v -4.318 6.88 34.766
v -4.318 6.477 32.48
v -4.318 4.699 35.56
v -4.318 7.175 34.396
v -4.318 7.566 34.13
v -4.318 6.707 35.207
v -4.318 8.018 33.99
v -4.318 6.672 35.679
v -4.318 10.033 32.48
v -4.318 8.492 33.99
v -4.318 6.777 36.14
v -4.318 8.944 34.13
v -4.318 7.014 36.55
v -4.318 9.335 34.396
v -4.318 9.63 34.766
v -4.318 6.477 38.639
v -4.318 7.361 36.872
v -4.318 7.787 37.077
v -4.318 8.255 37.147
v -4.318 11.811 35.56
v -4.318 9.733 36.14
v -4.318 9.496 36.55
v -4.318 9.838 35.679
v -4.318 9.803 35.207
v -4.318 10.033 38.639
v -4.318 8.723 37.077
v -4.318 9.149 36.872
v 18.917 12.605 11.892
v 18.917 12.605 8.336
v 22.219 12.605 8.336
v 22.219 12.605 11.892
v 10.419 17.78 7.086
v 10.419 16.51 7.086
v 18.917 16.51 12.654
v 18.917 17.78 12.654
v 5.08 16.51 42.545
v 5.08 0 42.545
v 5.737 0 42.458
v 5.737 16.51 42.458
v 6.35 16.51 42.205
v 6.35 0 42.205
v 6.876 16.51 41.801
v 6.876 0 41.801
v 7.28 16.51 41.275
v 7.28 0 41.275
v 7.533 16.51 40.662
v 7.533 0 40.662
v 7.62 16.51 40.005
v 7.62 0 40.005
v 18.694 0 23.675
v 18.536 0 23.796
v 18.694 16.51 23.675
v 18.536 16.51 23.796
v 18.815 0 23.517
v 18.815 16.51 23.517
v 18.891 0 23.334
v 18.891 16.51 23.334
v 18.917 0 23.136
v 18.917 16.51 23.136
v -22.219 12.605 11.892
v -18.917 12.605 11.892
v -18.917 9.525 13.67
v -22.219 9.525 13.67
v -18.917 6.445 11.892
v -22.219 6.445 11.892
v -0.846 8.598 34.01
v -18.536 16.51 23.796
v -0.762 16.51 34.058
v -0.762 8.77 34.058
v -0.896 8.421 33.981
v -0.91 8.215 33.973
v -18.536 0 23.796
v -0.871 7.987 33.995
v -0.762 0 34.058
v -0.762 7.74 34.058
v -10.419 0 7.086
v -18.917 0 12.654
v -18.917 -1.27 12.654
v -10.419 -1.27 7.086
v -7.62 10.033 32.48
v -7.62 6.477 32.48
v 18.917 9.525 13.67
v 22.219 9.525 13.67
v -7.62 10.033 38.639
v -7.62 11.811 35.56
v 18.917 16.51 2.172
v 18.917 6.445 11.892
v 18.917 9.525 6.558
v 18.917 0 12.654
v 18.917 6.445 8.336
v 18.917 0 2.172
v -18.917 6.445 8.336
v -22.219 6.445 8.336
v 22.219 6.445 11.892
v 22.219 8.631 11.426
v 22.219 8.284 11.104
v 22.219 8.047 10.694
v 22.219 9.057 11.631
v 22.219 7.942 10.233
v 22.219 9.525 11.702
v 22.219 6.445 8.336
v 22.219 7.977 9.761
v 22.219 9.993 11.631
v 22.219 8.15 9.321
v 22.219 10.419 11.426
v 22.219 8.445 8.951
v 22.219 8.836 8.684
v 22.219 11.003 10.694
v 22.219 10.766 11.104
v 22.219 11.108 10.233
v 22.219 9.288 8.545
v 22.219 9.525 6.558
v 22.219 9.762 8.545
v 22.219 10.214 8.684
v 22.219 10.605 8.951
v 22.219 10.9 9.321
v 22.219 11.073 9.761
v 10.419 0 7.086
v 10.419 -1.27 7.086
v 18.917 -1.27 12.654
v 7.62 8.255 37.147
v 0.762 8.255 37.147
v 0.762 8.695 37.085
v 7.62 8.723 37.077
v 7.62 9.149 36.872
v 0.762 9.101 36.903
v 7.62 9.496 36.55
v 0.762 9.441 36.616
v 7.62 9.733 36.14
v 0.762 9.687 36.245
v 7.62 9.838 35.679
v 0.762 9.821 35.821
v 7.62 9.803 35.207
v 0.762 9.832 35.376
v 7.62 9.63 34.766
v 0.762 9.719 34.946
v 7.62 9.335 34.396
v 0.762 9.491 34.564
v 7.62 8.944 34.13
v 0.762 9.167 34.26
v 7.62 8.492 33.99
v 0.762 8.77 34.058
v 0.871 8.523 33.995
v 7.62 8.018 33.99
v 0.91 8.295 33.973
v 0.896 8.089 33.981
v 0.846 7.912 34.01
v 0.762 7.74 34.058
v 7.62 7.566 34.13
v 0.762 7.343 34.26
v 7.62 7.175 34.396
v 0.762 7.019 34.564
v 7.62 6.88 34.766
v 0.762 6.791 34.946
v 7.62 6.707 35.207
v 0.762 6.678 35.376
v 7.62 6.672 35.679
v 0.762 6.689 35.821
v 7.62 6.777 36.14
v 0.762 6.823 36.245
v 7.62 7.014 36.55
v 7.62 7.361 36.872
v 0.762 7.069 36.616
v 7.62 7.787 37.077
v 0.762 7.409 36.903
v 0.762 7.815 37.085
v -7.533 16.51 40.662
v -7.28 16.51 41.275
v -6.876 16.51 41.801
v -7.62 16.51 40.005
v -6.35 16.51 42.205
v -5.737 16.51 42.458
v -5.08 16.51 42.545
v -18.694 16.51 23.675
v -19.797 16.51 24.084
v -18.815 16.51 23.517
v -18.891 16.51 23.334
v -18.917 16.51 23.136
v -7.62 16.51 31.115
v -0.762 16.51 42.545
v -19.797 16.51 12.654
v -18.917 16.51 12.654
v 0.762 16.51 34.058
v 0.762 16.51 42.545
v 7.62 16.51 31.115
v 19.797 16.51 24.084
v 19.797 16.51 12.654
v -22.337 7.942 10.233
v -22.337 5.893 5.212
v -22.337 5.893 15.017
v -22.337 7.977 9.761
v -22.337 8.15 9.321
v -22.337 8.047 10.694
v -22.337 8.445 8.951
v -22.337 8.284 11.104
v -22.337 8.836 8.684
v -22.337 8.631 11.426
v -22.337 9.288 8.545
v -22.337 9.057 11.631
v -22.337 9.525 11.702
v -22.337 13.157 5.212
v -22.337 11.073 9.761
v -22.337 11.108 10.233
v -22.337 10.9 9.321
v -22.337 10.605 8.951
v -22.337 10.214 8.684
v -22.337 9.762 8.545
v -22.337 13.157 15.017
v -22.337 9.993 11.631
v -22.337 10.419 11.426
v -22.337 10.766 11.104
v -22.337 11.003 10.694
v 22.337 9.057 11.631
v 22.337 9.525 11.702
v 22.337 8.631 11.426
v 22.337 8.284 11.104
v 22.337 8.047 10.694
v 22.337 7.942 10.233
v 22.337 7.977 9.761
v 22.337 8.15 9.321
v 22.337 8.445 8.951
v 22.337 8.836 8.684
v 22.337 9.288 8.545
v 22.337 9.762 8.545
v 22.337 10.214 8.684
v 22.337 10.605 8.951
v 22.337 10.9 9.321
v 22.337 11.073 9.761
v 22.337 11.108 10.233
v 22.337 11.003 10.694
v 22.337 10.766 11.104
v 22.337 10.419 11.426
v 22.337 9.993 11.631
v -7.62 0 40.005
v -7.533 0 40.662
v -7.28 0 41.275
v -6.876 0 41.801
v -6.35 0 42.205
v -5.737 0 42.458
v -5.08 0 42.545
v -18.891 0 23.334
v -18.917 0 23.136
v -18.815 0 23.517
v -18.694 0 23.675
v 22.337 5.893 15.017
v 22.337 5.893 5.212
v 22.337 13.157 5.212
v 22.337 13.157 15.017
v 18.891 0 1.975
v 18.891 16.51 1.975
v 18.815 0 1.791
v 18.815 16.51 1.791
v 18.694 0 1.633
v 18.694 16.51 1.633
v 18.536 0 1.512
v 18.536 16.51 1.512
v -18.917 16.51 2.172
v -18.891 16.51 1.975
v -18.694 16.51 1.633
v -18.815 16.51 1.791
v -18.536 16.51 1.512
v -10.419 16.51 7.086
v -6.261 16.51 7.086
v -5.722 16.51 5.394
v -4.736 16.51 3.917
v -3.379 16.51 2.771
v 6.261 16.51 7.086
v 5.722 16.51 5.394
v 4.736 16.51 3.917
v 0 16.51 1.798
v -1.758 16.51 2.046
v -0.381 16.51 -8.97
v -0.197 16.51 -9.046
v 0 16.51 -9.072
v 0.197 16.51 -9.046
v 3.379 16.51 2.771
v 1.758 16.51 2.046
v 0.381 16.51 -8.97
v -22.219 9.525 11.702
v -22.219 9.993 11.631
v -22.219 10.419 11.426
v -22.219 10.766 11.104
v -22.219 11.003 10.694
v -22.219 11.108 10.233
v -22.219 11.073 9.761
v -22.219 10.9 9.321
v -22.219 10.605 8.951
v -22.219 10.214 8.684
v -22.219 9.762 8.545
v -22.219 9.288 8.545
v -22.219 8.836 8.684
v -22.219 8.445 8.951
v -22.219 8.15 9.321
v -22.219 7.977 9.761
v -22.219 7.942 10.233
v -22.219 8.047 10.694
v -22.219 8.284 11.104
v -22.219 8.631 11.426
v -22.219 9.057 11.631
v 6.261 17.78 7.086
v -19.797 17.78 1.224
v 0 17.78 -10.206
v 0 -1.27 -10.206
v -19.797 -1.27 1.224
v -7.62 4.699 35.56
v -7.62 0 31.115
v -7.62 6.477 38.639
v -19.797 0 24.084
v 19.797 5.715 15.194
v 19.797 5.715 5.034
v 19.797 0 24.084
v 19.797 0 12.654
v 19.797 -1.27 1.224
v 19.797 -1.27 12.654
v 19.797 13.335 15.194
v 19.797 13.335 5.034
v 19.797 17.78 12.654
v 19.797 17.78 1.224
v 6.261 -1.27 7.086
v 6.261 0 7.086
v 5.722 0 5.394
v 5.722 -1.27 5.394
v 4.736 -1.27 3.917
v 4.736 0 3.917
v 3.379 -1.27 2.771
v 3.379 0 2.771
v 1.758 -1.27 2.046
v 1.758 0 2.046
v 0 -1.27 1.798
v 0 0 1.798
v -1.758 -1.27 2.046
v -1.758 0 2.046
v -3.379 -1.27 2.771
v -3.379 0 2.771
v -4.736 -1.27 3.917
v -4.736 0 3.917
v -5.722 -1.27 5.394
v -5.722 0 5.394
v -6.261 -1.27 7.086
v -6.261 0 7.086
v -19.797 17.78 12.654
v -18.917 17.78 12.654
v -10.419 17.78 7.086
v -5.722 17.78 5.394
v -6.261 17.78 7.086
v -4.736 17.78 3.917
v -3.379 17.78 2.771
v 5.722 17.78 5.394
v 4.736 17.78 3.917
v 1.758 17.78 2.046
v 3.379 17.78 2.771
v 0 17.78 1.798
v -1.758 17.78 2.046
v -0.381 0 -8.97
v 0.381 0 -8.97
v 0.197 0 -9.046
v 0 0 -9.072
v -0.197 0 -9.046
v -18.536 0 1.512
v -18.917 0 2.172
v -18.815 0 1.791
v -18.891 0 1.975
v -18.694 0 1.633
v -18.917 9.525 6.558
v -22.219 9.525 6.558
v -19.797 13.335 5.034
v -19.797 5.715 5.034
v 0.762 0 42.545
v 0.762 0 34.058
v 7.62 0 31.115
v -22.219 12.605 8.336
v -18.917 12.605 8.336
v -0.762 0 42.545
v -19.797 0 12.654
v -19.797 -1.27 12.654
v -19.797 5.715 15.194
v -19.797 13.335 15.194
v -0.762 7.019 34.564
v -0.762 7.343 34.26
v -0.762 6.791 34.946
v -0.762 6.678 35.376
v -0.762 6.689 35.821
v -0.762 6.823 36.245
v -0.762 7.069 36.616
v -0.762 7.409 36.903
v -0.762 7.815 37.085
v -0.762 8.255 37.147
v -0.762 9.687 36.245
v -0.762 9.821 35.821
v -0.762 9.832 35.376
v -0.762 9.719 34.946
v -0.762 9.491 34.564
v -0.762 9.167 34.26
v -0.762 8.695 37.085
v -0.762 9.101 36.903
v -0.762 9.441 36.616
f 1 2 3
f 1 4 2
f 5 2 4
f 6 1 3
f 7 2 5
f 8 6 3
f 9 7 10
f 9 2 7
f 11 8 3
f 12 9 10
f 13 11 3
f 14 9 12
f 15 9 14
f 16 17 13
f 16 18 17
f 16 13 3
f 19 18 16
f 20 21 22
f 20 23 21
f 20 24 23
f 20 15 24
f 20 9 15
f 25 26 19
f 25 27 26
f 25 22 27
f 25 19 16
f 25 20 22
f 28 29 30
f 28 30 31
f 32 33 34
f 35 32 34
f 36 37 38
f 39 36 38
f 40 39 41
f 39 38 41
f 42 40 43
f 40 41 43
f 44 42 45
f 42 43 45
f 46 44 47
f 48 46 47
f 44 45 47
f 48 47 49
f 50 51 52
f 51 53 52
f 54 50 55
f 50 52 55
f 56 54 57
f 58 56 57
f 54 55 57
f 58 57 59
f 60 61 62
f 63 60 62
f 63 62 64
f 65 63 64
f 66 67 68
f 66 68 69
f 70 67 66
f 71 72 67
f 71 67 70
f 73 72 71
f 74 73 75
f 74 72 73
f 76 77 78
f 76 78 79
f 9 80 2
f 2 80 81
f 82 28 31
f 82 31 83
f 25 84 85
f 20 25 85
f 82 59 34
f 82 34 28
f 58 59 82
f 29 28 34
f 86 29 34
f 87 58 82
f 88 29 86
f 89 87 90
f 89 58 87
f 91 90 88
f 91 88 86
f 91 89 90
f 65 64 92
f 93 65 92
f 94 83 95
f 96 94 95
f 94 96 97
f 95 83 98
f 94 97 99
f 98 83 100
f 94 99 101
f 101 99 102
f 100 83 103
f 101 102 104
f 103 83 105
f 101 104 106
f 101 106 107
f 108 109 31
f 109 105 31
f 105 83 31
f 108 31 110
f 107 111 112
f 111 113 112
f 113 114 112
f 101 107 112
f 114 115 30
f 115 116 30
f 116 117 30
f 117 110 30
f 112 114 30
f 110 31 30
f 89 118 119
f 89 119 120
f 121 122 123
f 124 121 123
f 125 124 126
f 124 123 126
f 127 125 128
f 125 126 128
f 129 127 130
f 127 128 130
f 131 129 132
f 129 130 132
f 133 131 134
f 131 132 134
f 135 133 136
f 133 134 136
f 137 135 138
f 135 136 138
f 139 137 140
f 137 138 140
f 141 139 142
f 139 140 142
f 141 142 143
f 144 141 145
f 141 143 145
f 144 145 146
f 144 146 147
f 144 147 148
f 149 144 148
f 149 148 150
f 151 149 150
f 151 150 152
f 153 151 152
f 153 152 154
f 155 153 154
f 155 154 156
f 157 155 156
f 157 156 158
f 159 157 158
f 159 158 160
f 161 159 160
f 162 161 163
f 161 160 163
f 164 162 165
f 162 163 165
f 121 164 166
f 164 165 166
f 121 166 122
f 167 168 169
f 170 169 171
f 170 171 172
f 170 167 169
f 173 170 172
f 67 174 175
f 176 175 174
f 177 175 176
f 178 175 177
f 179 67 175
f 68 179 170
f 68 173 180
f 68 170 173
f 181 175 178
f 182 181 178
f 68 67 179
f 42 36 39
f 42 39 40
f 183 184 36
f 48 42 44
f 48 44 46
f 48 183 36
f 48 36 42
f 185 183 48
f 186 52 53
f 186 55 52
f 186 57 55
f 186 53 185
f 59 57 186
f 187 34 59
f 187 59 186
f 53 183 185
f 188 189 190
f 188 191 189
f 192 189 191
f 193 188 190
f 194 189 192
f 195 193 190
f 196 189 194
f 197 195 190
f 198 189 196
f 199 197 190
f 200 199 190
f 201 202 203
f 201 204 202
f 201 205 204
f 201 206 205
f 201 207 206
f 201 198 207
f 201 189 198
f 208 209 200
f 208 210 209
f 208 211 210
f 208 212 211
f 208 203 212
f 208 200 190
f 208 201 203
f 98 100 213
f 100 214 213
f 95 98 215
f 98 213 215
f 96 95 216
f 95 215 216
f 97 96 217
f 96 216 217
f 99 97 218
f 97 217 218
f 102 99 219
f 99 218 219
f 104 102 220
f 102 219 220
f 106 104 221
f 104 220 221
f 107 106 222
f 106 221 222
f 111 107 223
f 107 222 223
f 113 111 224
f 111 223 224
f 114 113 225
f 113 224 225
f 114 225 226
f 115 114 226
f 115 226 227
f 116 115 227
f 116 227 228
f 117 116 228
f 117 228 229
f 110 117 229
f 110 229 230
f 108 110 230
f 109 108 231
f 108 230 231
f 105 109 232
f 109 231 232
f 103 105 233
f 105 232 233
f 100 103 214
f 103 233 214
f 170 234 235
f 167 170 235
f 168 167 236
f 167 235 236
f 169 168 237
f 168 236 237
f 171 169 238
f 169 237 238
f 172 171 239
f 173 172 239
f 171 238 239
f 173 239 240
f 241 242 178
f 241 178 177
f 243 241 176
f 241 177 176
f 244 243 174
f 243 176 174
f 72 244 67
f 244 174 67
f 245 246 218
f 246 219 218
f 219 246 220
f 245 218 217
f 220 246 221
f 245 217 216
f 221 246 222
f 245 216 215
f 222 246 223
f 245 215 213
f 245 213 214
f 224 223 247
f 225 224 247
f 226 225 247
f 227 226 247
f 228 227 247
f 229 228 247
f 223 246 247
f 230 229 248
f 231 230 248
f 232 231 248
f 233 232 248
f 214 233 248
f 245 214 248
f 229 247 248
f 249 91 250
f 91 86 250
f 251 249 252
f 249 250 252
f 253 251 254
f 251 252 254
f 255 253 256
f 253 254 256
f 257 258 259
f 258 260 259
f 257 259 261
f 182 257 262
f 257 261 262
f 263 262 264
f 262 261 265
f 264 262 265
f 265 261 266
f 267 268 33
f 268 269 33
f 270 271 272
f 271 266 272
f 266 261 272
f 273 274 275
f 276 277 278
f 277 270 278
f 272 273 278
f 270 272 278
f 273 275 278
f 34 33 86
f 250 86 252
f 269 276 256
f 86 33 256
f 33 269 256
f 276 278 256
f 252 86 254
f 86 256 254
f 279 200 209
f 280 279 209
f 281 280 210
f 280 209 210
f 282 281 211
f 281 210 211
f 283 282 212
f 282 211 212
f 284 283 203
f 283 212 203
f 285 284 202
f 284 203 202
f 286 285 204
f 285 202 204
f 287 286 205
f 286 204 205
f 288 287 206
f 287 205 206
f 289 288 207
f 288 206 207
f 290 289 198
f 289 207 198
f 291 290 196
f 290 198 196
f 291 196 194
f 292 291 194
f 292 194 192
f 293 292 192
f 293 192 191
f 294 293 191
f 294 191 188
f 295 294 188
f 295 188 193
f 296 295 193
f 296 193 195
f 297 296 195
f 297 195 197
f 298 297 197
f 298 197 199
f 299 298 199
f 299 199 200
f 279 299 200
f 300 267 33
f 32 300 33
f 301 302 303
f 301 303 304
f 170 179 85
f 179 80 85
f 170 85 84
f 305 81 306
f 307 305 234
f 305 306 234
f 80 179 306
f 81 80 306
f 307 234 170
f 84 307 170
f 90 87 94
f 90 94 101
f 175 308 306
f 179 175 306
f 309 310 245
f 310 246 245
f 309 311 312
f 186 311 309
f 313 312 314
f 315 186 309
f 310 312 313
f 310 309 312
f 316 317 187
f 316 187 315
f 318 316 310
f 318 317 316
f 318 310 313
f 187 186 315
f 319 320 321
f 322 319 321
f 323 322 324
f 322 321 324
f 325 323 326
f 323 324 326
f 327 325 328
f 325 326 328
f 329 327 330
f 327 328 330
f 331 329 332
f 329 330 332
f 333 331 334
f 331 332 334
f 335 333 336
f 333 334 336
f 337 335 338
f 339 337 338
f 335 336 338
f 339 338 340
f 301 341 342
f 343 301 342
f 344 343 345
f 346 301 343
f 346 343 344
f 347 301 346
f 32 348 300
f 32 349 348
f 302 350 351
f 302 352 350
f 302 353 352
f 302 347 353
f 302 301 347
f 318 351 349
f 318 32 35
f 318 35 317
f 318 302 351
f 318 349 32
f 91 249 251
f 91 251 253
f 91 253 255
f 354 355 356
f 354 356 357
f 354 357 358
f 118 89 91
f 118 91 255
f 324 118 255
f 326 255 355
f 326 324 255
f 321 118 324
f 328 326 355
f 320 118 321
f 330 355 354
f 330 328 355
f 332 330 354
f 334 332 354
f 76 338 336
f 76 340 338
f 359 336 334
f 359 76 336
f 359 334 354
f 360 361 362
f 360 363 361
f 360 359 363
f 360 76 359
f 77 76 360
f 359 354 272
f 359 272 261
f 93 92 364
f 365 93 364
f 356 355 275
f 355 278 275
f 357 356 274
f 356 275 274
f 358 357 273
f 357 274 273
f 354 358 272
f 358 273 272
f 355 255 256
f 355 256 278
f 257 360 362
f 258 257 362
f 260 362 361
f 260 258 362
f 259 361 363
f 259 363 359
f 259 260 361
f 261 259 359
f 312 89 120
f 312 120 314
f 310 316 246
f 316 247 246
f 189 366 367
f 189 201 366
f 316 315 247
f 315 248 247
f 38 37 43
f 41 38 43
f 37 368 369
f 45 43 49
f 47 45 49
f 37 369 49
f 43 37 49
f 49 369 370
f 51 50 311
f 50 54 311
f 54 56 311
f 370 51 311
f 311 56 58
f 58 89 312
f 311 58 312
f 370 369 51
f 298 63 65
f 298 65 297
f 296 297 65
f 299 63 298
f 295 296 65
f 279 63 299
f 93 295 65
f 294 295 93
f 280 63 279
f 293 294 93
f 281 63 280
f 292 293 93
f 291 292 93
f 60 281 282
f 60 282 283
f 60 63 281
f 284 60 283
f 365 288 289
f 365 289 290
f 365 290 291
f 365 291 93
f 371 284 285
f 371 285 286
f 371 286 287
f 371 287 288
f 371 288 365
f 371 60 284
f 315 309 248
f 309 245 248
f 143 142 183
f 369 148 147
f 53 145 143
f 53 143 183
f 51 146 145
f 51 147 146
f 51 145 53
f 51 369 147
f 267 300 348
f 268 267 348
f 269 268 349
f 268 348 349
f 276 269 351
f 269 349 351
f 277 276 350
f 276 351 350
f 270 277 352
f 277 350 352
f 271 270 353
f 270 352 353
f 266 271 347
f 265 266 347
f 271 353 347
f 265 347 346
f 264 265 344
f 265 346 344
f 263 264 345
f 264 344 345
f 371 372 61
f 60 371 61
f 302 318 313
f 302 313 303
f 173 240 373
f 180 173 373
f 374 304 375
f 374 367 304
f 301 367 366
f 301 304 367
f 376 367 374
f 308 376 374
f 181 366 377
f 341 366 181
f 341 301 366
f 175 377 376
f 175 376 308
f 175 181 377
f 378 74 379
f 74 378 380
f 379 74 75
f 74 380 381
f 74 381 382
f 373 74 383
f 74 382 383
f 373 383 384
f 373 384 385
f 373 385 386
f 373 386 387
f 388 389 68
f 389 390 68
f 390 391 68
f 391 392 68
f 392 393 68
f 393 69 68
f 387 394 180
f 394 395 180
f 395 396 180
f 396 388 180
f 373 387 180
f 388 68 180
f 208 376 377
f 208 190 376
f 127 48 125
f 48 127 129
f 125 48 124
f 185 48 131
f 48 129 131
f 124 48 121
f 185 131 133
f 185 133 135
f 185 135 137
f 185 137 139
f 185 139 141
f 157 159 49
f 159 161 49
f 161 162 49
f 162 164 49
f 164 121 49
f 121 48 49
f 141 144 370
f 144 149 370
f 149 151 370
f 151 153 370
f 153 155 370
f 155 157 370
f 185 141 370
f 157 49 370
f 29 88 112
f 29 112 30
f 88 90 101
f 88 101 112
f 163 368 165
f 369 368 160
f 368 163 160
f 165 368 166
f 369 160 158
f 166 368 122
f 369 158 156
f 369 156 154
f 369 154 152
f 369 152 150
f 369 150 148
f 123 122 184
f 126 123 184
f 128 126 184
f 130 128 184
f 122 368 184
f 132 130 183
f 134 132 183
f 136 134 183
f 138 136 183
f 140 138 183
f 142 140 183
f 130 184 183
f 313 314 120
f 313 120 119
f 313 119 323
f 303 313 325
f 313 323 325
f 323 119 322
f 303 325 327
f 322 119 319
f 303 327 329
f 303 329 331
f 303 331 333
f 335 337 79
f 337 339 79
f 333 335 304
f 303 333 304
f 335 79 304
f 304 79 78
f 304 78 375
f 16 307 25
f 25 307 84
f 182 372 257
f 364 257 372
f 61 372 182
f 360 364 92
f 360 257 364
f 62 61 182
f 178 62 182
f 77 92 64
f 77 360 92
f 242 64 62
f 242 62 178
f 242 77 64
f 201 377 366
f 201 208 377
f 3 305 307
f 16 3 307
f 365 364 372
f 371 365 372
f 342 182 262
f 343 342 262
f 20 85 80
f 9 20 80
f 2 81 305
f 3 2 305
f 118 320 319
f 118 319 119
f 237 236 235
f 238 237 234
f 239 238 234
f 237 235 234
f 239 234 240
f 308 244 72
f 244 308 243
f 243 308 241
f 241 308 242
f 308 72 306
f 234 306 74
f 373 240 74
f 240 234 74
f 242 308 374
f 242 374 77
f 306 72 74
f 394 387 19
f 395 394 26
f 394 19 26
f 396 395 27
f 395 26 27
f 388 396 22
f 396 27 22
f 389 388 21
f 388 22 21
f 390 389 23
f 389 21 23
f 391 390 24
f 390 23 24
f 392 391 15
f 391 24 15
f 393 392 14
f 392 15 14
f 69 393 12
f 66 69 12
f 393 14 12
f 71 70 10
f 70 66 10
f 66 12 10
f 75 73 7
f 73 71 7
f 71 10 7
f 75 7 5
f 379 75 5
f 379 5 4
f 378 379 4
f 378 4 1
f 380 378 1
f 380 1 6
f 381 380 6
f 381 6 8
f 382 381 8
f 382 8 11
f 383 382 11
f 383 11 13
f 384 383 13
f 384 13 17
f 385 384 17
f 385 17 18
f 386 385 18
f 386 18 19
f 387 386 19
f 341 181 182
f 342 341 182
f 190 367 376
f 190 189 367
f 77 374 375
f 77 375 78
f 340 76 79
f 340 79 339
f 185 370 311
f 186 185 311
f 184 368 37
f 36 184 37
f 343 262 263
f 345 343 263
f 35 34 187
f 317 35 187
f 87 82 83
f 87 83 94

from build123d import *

# Parameters (mm, degrees)
BOSS_EXTRUDE1_DEPTH = 16.51
CUT_EXTRUDE1_DEPTH  = 50.74516387
SKETCH4_R           = 1.5875
CUT_EXTRUDE2_DEPTH  = 54.238681437
BOSS_EXTRUDE3_DEPTH = 1.27
BOSS_EXTRUDE4_DEPTH = 1.27
SKETCH11_W          = 10.16
SKETCH11_H          = 7.62
BOSS_EXTRUDE5_DEPTH = 2.54
BOSS_EXTRUDE5_TAPER = 4
SKETCH12_R          = 1.5875
CUT_EXTRUDE3_DEPTH  = 63.462199051
CUT_EXTRUDE4_DEPTH  = 3.302
FILLET1_R           = 0.762
SKETCH14_R          = 1.5875
CUT_EXTRUDE6_DEPTH  = 65.202975796
CUT_EXTRUDE7_DEPTH  = 3.302
CUT_EXTRUDE10_DEPTH = 76.2


with BuildPart() as part:
    # Sketch1 → Boss-Extrude1 (new body)
    with BuildSketch(Plane(origin=(0, 0, 0), x_dir=(1, 0, 0), z_dir=(0, 1, 0))):
        with BuildLine():
            Line((-7.62, -31.114876642), (-7.62, -40.004876642))
            ThreePointArc((-7.62, -40.004876642), (-6.876051224, -41.800927866), (-5.08, -42.544876642))
            Line((-5.08, -42.544876642), (5.08, -42.544876642))
            ThreePointArc((5.08, -42.544876642), (6.876051224, -41.800927866), (7.62, -40.004876642))
            Line((7.62, -40.004876642), (7.62, -31.114876642))
            Line((7.62, -31.114876642), (19.797340731, -24.084285693))
            Line((19.797340731, -24.084285693), (19.797340731, -1.224285693))
            Line((19.797340731, -1.224285693), (0, 10.205714307))
            Line((0, 10.205714307), (-19.797340731, -1.224285693))
            Line((-19.797340731, -1.224285693), (-19.797340731, -24.084285693))
            Line((-19.797340731, -24.084285693), (-7.62, -31.114876642))
        make_face()
        Polygon((0, 9.189714307), (-18.91745892, -1.732285693), (-18.91745892, -23.576285693), (0, -34.498285693), (18.91745892, -23.576285693), (18.91745892, -1.732285693), align=None, mode=Mode.SUBTRACT)
    extrude(amount=BOSS_EXTRUDE1_DEPTH)

    # Sketch2 → Cut-Extrude1 (cut, through all)
    with BuildSketch(Plane(origin=(0, 16.51, 0), x_dir=(1, 0, 0), z_dir=(0, 1, 0))):
        Polygon((-0.762, -34.058344788), (-0.762, -42.544876642), (0.762, -42.544876642), (0.762, -34.058344788), (0, -34.498285693), align=None)
    extrude(amount=-CUT_EXTRUDE1_DEPTH, mode=Mode.SUBTRACT)

    # Sketch4 → Cut-Extrude2 (cut, through all)
    with BuildSketch(Plane.ZY.offset(7.62)):
        with Locations((35.559876642, 8.255)):
            Circle(SKETCH4_R)
    extrude(amount=-CUT_EXTRUDE2_DEPTH, mode=Mode.SUBTRACT)

    # Sketch8 → Boss-Extrude3 (add)
    with BuildSketch(Plane(origin=(0, 16.51, 0), x_dir=(1, 0, 0), z_dir=(0, 1, 0))):
        Polygon((-10.419364221, -7.085804169), (10.419364221, -7.085804169), (18.91745892, -12.654285693), (19.797340731, -12.654285693), (19.797340731, -1.224285693), (0, 10.205714307), (-19.797340731, -1.224285693), (-19.797340731, -12.654285693), (-18.91745892, -12.654285693), align=None)
    extrude(amount=BOSS_EXTRUDE3_DEPTH)

    # Sketch9 → Boss-Extrude4 (add)
    with BuildSketch(Plane.XZ):
        Polygon((-10.419364221, 7.085804169), (10.419364221, 7.085804169), (18.91745892, 12.654285693), (19.797340731, 12.654285693), (19.797340731, 1.224285693), (0, -10.205714307), (-19.797340731, 1.224285693), (-19.797340731, 12.654285693), (-18.91745892, 12.654285693), align=None)
    extrude(amount=BOSS_EXTRUDE4_DEPTH)

    # Sketch11 → Boss-Extrude5 (add)
    with BuildSketch(Plane.ZY.offset(19.797340731)):
        with Locations((10.114285693, 9.525)):
            Rectangle(SKETCH11_W, SKETCH11_H)
    boss_extrude5 = extrude(amount=BOSS_EXTRUDE5_DEPTH, taper=BOSS_EXTRUDE5_TAPER)

    # Sketch12 → Cut-Extrude3 (cut, through all)
    with BuildSketch(Plane.ZY.offset(22.337340731)):
        with Locations((10.114285693, 9.525)):
            Circle(SKETCH12_R)
    extrude(amount=-CUT_EXTRUDE3_DEPTH, mode=Mode.SUBTRACT)

    # Sketch13 → Cut-Extrude4 (cut)
    with BuildSketch(Plane(origin=(-18.91745892, 0, 0), x_dir=(0, 0, -1), z_dir=(1, 0, 0))):
        Polygon((-8.336285693, 12.604586336), (-11.892285693, 12.604586336), (-13.670285693, 9.525), (-11.892285693, 6.445413664), (-8.336285693, 6.445413664), (-6.558285693, 9.525), align=None)
    cut_extrude4 = extrude(amount=-CUT_EXTRUDE4_DEPTH, mode=Mode.SUBTRACT)

    # Mirror1: Boss-Extrude5, Cut-Extrude4 across plane
    add(boss_extrude5.mirror(Plane(origin=(0, 0, 0), x_dir=(0, 0, 1), z_dir=(1, 0, 0))))
    add(cut_extrude4.mirror(Plane(origin=(0, 0, 0), x_dir=(0, 0, 1), z_dir=(1, 0, 0))), mode=Mode.SUBTRACT)

    # Fillet1
    fillet1_edges = [part.edges().sort_by_distance(p)[0] for p in [
        (18.91745892, 8.255, 1.732285693),
        (0, 8.255, -9.189714307),
        (-18.91745892, 8.255, 1.732285693),
        (-18.91745892, 8.255, 23.576285693),
        (18.91745892, 8.255, 23.576285693),
    ]]
    fillet(fillet1_edges, radius=FILLET1_R)

    # Sketch14 → Cut-Extrude6 (cut, through all)
    with BuildSketch(Plane(origin=(22.337340731, 0, 0), x_dir=(0, 0, -1), z_dir=(1, 0, 0))):
        with Locations(Location((-10.114285693, 9.525, 0), (0, 0, 180))):
            Circle(SKETCH14_R)
    extrude(amount=-CUT_EXTRUDE6_DEPTH, mode=Mode.SUBTRACT)

    # Sketch15 → Cut-Extrude7 (cut)
    with BuildSketch(Plane.ZY.offset(7.62)):
        Polygon((35.559876642, 11.811), (32.480290306, 10.033), (32.480290306, 6.477), (35.559876642, 4.699), (38.639462978, 6.477), (38.639462978, 10.033), align=None)
    extrude(amount=-CUT_EXTRUDE7_DEPTH, mode=Mode.SUBTRACT)

    # Sketch16 → Cut-Extrude10 (cut)
    with BuildSketch(Plane(origin=(0, 17.78, 0), x_dir=(1, 0, 0), z_dir=(0, 1, 0))):
        with BuildLine():
            Line((-6.260612009, -7.085804169), (6.260612009, -7.085804169))
            ThreePointArc((6.260612009, -7.085804169), (0, -1.797518476), (-6.260612009, -7.085804169))
        make_face()
    extrude(amount=-CUT_EXTRUDE10_DEPTH, mode=Mode.SUBTRACT)


solid = part.part
